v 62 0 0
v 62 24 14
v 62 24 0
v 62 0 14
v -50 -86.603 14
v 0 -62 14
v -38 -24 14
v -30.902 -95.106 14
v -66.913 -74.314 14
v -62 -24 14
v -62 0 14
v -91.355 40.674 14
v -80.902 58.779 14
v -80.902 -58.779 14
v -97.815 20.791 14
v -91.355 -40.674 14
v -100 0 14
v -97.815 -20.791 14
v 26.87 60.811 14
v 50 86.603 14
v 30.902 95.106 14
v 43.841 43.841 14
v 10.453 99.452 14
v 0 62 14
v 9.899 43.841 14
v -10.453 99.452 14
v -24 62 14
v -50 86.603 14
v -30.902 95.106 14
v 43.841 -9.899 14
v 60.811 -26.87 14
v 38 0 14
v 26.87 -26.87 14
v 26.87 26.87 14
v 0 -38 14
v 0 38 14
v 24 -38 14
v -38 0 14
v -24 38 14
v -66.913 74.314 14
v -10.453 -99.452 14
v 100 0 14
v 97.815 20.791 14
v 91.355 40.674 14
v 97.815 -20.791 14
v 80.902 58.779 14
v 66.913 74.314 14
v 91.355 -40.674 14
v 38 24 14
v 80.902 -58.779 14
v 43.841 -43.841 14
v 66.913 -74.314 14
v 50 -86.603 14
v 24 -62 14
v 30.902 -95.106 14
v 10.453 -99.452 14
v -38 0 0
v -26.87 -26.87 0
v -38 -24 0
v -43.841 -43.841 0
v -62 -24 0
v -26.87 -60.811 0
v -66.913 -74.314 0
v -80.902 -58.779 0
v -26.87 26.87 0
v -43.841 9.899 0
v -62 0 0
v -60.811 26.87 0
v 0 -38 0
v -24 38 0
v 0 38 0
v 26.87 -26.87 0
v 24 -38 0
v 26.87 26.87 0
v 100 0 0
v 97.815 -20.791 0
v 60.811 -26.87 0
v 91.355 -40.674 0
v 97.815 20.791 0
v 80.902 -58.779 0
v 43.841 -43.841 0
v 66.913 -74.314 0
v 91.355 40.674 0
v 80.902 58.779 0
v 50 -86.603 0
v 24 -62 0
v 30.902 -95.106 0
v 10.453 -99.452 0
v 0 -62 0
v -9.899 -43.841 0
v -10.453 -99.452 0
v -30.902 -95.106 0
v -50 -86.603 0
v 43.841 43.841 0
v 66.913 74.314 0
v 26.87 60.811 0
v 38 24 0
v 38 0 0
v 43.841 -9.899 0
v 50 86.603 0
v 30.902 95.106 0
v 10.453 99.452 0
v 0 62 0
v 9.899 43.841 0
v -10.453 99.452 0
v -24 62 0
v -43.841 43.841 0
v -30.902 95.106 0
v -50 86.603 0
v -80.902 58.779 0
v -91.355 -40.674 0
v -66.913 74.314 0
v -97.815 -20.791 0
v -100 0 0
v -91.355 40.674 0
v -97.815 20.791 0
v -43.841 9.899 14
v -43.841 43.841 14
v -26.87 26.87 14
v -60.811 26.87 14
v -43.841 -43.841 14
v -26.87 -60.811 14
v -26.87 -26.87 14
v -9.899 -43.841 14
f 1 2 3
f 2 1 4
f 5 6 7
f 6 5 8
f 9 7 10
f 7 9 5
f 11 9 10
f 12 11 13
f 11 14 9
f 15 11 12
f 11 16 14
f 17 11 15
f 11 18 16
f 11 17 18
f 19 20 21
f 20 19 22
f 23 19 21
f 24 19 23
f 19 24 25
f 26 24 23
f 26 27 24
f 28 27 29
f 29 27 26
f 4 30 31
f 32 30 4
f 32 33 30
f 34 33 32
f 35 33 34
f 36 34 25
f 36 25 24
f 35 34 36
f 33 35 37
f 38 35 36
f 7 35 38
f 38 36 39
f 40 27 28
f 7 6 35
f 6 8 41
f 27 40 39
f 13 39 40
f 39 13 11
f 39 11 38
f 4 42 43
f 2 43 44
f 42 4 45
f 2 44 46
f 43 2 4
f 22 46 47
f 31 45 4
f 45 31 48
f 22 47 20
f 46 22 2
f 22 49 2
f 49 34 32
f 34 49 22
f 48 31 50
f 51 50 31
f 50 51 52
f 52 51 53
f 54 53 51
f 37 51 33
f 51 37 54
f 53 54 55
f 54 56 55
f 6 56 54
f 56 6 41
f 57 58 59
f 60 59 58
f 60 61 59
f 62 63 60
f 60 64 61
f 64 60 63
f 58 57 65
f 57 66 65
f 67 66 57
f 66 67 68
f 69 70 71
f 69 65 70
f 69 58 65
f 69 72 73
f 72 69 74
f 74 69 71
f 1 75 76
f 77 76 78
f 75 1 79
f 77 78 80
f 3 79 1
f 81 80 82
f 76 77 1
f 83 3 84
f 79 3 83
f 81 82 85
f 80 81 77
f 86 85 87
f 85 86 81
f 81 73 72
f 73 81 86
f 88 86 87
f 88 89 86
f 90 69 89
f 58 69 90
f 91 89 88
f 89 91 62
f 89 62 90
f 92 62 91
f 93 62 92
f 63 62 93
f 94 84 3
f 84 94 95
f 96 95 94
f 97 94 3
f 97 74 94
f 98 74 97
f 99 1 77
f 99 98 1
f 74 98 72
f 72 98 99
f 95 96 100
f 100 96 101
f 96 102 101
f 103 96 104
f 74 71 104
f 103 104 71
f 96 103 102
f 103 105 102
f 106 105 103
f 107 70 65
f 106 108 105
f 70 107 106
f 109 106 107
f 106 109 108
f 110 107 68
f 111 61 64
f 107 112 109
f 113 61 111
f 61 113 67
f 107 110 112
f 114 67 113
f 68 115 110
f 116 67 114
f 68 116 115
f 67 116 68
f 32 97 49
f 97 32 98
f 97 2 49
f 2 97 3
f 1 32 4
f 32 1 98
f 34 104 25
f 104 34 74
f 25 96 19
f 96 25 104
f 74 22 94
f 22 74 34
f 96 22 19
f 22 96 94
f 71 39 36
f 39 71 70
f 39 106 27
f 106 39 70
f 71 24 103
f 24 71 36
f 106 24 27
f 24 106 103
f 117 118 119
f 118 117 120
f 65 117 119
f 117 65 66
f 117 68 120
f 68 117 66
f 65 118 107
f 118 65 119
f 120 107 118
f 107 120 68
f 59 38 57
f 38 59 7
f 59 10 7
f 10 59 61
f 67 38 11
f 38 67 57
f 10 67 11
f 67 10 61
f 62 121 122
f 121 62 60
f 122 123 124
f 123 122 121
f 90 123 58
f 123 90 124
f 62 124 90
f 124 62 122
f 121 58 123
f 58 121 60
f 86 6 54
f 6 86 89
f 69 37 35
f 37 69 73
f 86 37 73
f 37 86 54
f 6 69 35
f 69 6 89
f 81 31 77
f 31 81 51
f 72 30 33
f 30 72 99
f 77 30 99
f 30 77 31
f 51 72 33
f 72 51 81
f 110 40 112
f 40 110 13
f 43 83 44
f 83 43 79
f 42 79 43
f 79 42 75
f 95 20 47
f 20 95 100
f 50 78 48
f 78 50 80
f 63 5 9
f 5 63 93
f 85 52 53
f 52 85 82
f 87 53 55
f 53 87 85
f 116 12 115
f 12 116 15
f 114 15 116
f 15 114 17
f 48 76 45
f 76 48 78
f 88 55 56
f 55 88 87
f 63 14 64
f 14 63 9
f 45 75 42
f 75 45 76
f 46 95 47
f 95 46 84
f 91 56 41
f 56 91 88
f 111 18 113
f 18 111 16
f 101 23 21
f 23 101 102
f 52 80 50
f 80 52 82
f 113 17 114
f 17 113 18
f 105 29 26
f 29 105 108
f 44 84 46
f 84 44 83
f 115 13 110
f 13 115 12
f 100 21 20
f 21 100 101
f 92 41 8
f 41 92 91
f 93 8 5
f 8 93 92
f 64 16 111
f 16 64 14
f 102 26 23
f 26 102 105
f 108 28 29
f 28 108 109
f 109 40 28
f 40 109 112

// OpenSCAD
// file: switch.scad
switch_width = 24;
switch_length = 24;
switch_height = 14;

module switch() {
  color("OliveDrab")
    cube(size=[switch_width,switch_length,switch_height]);
}
// main file
include <switch.scad>

module switch_ring(num_switches, inner_diameter, outer_diameter) {
  difference() {
    linear_extrude(height=switch_height)
      circle(r=outer_diameter/2);
    for(angle=[0 : (360/num_switches) : 360]) {
      translate([cos(angle) * (inner_diameter-switch_width)/2,
                 sin(angle) * (inner_diameter-switch_width)/2,
                 0]) {
        rotate(angle) {
          switch();
        }
      }
    }
  }
}

switch_ring(8, 100, 200);
